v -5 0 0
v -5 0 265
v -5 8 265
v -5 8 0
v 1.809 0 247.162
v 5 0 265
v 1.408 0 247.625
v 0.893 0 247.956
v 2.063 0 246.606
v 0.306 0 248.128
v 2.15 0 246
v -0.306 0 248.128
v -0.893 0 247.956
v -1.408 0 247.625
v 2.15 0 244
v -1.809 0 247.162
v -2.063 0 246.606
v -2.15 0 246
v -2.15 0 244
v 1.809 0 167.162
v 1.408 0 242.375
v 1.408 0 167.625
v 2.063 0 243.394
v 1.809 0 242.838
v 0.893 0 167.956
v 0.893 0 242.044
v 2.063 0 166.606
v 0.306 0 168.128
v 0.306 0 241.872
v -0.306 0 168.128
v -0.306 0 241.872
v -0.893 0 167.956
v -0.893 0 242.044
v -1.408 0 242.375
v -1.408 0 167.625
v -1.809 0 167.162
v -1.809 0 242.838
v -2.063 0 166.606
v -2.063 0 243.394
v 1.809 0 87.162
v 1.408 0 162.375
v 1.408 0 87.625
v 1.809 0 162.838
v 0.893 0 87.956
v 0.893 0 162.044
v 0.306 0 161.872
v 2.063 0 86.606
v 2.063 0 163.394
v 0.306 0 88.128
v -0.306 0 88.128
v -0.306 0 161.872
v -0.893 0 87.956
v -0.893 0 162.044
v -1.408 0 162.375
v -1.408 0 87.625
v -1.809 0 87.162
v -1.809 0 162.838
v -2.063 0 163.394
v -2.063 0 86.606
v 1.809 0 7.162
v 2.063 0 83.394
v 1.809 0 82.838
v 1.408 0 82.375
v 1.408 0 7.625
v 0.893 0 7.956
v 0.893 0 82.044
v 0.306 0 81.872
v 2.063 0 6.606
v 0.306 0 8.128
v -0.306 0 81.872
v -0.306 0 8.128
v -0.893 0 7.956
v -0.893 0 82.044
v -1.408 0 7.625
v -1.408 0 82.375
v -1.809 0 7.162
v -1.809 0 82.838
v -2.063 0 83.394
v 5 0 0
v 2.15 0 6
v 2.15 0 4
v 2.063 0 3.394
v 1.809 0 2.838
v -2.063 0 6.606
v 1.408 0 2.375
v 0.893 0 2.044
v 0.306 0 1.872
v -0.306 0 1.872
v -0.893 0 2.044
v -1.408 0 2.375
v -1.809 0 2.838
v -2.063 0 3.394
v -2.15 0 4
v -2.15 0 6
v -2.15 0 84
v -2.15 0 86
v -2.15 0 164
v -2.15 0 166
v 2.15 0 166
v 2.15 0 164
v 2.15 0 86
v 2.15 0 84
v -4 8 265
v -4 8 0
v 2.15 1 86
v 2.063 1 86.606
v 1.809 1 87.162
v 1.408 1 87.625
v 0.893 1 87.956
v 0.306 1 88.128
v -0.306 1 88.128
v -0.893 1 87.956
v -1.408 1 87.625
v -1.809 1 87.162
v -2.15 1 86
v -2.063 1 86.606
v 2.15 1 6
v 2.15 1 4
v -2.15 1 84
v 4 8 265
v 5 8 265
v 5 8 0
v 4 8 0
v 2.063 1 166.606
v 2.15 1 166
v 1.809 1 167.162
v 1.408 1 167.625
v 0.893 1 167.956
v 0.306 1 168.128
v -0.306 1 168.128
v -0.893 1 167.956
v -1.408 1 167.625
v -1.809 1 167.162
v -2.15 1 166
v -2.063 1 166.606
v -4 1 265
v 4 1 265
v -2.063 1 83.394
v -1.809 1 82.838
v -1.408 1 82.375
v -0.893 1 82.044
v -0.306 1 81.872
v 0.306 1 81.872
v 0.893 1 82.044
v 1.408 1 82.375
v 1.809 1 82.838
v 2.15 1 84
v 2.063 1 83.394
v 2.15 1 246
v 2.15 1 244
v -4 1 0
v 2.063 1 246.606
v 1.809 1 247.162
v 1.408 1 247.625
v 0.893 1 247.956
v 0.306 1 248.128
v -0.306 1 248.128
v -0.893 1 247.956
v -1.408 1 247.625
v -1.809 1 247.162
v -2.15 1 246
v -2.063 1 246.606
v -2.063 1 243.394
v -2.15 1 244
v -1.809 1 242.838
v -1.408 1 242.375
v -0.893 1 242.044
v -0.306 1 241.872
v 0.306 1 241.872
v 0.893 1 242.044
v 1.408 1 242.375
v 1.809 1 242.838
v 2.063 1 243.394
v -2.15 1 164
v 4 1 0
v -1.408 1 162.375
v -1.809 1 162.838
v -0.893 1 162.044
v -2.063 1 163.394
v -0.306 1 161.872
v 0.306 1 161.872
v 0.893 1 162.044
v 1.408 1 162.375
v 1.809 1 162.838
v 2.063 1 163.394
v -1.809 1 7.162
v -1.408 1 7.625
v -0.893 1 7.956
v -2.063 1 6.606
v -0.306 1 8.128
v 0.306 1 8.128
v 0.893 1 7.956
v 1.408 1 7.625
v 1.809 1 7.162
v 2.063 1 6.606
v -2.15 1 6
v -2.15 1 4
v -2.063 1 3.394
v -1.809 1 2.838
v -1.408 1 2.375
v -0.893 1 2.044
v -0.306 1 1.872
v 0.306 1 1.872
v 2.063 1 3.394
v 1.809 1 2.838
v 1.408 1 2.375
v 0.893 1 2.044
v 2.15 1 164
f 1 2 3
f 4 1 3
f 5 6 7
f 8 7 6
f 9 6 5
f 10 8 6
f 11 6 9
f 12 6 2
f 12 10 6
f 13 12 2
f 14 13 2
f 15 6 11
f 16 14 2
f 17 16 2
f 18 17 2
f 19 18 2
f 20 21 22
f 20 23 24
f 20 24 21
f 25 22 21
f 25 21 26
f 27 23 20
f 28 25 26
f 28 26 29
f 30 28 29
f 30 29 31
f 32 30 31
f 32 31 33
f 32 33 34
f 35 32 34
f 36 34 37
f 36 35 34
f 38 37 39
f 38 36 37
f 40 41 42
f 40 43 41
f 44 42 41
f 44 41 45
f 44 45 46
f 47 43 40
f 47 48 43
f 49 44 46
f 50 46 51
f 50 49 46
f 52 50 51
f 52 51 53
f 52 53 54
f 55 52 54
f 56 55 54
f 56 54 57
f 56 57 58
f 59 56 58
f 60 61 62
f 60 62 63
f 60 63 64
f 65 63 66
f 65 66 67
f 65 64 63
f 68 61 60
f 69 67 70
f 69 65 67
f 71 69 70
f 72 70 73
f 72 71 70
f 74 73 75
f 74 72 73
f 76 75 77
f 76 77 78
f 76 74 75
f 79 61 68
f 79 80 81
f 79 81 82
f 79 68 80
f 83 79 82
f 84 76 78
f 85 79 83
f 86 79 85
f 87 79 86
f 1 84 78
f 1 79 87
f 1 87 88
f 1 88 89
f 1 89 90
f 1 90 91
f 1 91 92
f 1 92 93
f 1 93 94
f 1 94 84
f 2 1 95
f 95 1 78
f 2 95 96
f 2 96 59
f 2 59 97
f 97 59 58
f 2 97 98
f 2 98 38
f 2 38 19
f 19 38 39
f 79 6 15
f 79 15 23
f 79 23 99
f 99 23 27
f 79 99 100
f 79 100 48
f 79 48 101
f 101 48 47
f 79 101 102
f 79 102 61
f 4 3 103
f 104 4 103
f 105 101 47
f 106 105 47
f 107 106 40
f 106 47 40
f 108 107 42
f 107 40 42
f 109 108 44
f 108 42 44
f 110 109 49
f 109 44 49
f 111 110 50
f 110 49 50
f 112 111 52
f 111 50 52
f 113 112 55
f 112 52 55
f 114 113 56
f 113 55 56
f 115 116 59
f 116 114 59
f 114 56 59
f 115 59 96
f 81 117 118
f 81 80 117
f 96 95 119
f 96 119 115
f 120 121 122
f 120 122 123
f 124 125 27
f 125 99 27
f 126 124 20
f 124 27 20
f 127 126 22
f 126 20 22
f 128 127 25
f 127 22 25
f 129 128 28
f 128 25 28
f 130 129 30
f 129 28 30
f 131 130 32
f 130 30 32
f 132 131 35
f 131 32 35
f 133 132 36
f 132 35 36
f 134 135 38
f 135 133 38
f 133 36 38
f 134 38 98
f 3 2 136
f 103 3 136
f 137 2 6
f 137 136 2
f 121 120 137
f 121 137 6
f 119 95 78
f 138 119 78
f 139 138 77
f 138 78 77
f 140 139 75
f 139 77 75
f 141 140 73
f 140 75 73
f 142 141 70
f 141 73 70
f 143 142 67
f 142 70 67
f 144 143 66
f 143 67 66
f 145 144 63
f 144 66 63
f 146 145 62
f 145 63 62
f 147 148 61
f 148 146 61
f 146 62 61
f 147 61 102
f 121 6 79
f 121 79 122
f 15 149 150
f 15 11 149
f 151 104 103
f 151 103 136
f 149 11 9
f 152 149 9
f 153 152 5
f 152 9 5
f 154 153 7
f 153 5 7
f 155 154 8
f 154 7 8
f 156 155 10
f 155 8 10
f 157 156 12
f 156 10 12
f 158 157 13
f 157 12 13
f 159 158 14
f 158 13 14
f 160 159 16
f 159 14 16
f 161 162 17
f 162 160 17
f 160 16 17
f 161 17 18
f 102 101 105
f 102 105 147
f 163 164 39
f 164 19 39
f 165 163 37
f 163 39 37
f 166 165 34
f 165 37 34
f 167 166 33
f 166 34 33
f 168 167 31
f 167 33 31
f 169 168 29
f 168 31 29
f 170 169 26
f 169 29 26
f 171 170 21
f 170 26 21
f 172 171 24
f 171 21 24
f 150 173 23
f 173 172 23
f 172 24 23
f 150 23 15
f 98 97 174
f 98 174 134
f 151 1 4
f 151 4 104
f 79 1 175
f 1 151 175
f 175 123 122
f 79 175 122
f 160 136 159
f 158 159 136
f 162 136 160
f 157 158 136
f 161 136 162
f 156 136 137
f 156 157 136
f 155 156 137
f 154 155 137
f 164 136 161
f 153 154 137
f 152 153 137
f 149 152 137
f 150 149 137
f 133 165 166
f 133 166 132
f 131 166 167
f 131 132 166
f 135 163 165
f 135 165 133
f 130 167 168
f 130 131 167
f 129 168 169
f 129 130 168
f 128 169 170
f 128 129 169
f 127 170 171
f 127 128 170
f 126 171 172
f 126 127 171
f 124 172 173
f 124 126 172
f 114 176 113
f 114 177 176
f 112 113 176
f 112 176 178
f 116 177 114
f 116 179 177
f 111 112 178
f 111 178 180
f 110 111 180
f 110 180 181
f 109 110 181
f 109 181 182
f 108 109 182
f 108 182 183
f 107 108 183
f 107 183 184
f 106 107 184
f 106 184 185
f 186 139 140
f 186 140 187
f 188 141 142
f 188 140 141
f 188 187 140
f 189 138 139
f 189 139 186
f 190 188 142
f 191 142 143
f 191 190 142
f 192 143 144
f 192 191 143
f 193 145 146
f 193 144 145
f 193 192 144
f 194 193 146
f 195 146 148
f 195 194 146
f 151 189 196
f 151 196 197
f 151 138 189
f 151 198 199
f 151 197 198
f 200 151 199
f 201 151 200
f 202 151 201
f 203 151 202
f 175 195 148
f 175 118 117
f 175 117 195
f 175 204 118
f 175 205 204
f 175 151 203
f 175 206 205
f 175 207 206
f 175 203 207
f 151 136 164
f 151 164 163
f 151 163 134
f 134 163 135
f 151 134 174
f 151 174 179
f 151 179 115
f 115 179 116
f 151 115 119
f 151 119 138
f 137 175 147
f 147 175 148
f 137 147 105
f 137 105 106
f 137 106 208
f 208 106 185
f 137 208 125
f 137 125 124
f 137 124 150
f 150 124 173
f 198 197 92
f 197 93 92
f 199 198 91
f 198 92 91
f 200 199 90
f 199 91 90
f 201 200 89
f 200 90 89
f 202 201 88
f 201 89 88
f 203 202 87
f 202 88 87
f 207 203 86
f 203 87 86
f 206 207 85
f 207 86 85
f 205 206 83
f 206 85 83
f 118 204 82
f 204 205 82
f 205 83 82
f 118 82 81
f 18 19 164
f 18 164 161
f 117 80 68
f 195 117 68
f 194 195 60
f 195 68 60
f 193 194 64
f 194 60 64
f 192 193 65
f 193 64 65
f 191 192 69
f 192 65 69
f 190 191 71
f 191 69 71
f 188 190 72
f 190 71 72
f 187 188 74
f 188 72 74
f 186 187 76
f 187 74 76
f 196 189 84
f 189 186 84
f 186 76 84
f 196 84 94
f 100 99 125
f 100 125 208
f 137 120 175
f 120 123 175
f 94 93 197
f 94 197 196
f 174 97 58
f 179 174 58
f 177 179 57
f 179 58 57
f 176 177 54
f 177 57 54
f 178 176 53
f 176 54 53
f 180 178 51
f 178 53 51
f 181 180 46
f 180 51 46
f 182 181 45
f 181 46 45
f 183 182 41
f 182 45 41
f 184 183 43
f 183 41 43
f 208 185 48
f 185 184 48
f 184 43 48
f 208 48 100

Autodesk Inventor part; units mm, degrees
ref_plane "YZ Plane" through (0, 0, 0) normal (1, 0, 0) x (0, 1, 0)
ref_plane "XY Plane" through (0, 0, 0) normal (0, 0, 1) x (1, 0, 0)
sketch "Skizze1" plane through (0, 0, 0) normal (0, 0, 1) x (1, 0, 0)
  line L0 (0, 0) -> (5, 0)
  line L1 (5, 0) -> (5, 8)
  line L2 (5, 8) -> (4, 8)
  line L3 (4, 8) -> (4, 1)
  line L4 (4, 1) -> (0, 1)
  line L5 (0, 9.6) -> (0, -1.6) construction
  line L6 (0, 0) -> (-5, 0)
  line L7 (-5, 0) -> (-5, 8)
  line L8 (-5, 8) -> (-4, 8)
  line L9 (-4, 8) -> (-4, 1)
  line L10 (-4, 1) -> (0, 1)
  dimension "d0" = 1
  dimension "d1" = 1
  dimension "d2" = 8
  dimension "d3" = 5
extrude "Ex-UProfil" add sketch "Skizze1" along normal blind 265
sketch "Skizze2" plane through (0, 0, 0) normal (0, 1, 0) x (-1, 0, 0)
  line L0 (5, 0) -> (-5, 0) projected
  line L1 (-5, 0) -> (-5, 265) projected
  line L2 (5, 265) -> (-5, 265) projected
  line L3 (5, 0) -> (5, 265) projected
  line L4 (0, -65.78) -> (0, 302.63) construction
  circle A0 centre (0, 245) radius 2.15 construction
  line L5 (0, 246) -> (0, 244) construction
  line L6 (-2.15, 246) -> (-2.15, 244)
  line L7 (2.15, 244) -> (2.15, 246)
  arc A1 (2.15, 246) -> (-2.15, 246) centre (0, 246) ccw
  arc A2 (-2.15, 244) -> (2.15, 244) centre (0, 244) ccw
  circle A3 centre (0, 165) radius 2.15 construction
  line L8 (0, 166) -> (0, 164) construction
  line L9 (-2.15, 166) -> (-2.15, 164)
  line L10 (2.15, 164) -> (2.15, 166)
  arc A4 (2.15, 166) -> (-2.15, 166) centre (0, 166) ccw
  arc A5 (-2.15, 164) -> (2.15, 164) centre (0, 164) ccw
  circle A6 centre (0, 85) radius 2.15 construction
  line L11 (0, 86) -> (0, 84) construction
  line L12 (-2.15, 86) -> (-2.15, 84)
  line L13 (2.15, 84) -> (2.15, 86)
  arc A7 (2.15, 86) -> (-2.15, 86) centre (0, 86) ccw
  arc A8 (-2.15, 84) -> (2.15, 84) centre (0, 84) ccw
  circle A9 centre (0, 5) radius 2.15 construction
  line L14 (0, 6) -> (0, 4) construction
  line L15 (-2.15, 6) -> (-2.15, 4)
  line L16 (2.15, 4) -> (2.15, 6)
  arc A10 (2.15, 6) -> (-2.15, 6) centre (0, 6) ccw
  arc A11 (-2.15, 4) -> (2.15, 4) centre (0, 4) ccw
  point P0 (0, 0)
  point P1 (0, 248.15)
  point P2 (0, 241.85)
  point P3 (0, 168.15)
  point P4 (0, 161.85)
  point P5 (0, 88.15)
  point P6 (0, 81.85)
  point P7 (0, 8.15)
  point P8 (0, 1.85)
  dimension "d6" = 4.3
  dimension "d7" = 20
  dimension "d8" = 4.3
  dimension "d9" = 6.3
  dimension "d21" = 80
extrude "Ex-Bohrungen" cut sketch "Skizze2" along normal up to surface (1 mm away) contours A1 L7 A2 L6 | A4 L10 A5 L9 | A7 L13 A8 L12 | A10 L16 A11 L15
equation "\"d8\" = d6"
properties part number "U-Profil PanelSupport 10x8x265mm"
